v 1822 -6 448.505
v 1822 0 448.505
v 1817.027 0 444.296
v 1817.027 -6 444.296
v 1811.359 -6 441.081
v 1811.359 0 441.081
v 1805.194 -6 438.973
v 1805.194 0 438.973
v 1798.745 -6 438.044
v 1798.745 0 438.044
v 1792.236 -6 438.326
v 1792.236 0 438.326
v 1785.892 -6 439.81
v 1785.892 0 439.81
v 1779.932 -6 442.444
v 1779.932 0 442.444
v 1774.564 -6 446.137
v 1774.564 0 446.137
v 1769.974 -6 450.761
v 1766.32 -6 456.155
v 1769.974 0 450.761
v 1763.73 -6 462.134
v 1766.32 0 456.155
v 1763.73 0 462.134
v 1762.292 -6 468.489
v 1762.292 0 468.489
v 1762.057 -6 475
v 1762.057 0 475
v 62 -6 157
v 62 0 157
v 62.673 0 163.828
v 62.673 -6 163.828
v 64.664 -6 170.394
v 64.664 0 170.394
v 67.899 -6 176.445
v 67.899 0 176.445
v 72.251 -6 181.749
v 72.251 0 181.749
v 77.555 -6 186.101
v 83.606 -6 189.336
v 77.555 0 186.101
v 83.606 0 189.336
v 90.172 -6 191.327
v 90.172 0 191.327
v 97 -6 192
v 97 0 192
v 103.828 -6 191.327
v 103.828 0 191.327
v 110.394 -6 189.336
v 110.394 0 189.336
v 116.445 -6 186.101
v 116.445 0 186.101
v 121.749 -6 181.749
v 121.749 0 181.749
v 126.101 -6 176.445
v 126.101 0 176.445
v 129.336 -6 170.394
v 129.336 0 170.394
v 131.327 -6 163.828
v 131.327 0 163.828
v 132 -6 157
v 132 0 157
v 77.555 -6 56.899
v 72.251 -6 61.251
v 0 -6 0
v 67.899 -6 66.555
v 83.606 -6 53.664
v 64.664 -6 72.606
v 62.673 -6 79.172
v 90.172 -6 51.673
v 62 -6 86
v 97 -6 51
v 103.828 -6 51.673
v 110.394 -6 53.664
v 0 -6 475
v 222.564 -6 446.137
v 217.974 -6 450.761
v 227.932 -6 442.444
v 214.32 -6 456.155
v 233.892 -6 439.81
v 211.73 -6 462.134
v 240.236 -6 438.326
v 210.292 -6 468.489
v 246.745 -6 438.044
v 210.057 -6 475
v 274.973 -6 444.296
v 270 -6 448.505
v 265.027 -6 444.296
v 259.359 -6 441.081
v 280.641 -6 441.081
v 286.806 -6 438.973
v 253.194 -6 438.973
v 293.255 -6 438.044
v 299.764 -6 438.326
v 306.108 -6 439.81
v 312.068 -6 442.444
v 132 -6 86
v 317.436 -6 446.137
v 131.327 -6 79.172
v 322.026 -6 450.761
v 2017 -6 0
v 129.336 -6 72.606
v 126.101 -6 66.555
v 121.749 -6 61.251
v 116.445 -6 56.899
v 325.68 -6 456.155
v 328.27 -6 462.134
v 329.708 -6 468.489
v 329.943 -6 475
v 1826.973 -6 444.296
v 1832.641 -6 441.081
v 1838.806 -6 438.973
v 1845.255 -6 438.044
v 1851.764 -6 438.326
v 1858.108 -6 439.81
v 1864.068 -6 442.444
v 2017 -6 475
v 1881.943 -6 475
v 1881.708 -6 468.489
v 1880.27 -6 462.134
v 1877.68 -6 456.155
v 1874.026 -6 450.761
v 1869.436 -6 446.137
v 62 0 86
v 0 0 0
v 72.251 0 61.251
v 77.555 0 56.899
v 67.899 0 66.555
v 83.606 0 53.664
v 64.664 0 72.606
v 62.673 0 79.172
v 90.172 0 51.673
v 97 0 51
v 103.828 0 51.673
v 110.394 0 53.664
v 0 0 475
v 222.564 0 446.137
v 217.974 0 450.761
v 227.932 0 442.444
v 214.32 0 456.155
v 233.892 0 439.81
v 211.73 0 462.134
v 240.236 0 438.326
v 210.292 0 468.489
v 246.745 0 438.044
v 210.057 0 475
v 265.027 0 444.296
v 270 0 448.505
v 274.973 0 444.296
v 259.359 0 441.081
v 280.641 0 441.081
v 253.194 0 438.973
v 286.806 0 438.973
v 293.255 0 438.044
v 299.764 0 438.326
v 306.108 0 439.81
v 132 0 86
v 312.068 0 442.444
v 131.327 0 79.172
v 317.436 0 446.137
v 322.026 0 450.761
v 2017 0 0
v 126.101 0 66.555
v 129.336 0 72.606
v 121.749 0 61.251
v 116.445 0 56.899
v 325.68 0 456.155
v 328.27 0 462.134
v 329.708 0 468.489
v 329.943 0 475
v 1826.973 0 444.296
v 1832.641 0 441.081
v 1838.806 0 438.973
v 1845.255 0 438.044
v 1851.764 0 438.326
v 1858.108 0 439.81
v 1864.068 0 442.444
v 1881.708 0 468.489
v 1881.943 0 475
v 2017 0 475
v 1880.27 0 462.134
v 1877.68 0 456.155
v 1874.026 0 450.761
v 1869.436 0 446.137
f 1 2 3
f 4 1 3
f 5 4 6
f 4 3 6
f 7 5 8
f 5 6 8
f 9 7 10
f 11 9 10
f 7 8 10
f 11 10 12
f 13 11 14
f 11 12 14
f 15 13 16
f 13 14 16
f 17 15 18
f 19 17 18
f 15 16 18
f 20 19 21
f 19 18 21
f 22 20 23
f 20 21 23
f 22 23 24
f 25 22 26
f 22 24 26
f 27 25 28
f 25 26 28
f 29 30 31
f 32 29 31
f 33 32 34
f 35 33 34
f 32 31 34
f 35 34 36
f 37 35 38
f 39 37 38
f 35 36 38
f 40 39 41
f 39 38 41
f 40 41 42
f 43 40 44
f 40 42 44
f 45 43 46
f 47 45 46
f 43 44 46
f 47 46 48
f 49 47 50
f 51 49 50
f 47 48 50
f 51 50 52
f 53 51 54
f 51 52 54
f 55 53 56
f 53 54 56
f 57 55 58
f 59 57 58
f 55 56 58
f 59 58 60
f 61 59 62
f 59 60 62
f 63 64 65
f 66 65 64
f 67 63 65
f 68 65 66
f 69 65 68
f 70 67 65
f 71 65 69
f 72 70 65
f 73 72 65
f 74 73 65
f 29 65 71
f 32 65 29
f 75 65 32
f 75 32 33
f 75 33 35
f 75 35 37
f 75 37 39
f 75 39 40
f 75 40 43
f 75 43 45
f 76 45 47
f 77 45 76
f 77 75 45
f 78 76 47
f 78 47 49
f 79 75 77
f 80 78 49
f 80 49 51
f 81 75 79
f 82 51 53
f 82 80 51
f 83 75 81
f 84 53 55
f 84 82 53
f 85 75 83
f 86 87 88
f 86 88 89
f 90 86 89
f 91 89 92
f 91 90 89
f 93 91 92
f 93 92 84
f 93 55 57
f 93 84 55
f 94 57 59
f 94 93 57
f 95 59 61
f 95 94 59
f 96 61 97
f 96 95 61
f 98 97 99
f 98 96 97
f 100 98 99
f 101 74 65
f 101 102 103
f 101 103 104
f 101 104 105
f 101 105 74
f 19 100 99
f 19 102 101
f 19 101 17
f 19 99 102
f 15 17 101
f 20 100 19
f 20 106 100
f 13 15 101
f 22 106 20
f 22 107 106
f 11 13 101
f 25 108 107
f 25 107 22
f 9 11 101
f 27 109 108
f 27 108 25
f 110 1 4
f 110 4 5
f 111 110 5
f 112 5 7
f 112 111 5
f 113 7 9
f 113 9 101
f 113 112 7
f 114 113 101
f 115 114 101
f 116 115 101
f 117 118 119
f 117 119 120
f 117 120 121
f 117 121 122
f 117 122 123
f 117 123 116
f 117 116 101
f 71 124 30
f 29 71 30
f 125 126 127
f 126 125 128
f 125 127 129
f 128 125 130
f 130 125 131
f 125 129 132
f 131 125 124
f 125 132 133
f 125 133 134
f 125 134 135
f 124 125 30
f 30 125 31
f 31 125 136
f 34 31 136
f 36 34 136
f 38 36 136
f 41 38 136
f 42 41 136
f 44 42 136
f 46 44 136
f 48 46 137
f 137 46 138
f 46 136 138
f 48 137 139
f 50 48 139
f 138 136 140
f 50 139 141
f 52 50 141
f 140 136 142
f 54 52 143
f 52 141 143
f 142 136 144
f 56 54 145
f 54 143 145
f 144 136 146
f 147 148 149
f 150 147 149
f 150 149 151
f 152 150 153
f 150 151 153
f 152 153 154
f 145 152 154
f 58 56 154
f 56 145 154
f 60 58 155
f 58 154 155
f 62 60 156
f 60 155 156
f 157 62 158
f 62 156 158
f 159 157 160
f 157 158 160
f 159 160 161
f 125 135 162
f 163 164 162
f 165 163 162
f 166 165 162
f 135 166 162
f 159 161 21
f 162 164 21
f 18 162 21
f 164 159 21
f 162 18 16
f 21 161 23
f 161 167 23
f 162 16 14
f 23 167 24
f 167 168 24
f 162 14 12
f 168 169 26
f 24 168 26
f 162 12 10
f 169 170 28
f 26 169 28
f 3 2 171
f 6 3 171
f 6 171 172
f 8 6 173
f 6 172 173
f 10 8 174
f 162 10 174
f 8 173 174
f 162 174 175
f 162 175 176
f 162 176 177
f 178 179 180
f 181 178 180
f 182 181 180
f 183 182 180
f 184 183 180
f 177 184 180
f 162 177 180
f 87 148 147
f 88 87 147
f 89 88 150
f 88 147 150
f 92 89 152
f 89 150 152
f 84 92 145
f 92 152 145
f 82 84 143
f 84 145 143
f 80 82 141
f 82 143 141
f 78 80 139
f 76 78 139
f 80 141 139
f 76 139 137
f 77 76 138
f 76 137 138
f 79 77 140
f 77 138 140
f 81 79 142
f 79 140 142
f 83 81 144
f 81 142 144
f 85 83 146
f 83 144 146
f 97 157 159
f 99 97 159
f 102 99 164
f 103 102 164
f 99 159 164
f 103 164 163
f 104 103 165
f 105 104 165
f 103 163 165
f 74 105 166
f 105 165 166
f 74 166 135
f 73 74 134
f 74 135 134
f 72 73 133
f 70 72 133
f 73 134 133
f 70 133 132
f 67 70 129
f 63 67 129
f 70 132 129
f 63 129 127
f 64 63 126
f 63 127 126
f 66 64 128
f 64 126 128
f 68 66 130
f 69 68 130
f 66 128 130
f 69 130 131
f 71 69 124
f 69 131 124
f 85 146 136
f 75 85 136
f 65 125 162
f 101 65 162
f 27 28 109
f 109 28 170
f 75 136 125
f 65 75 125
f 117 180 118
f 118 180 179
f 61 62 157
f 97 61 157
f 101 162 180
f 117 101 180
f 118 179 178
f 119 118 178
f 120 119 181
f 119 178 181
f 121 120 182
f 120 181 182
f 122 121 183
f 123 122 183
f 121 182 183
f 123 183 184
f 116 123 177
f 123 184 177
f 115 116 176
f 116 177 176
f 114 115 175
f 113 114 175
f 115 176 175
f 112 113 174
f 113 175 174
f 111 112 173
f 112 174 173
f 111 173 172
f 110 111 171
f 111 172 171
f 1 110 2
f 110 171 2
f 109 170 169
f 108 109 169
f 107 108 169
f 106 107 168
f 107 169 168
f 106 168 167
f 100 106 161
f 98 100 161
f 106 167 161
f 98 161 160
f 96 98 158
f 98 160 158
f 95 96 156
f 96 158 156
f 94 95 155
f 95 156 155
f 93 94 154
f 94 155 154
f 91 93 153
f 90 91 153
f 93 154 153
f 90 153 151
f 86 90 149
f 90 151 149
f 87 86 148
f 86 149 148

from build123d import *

# Parameters (mm, degrees)
F1_DEPTH = 6


with BuildPart() as f1:
    # F0 (on Front) → F1 (new body)
    with BuildSketch(Plane.XZ):
        with BuildLine():
            Line((0, 475), (0, 0))
            Line((0, 0), (2017, 0))
            Line((2017, 0), (2017, 475))
            Line((2017, 475), (1881.94281, 475))
            ThreePointArc((1881.94281, 475), (1861.14955, 440.987655), (1822, 448.505103))
            ThreePointArc((1822, 448.505103), (1782.85045, 440.987655), (1762.05719, 475))
            Line((1762.05719, 475), (329.94281, 475))
            ThreePointArc((329.94281, 475), (309.14955, 440.987655), (270, 448.505103))
            ThreePointArc((270, 448.505103), (230.85045, 440.987655), (210.05719, 475))
            Line((210.05719, 475), (0, 475))
        make_face()
        with BuildLine():
            ThreePointArc((62, 157), (97, 192), (132, 157))
            Line((132, 157), (132, 86))
            ThreePointArc((132, 86), (97, 51), (62, 86))
            Line((62, 86), (62, 157))
        make_face(mode=Mode.SUBTRACT)
    extrude(amount=F1_DEPTH)


solid = f1.part
